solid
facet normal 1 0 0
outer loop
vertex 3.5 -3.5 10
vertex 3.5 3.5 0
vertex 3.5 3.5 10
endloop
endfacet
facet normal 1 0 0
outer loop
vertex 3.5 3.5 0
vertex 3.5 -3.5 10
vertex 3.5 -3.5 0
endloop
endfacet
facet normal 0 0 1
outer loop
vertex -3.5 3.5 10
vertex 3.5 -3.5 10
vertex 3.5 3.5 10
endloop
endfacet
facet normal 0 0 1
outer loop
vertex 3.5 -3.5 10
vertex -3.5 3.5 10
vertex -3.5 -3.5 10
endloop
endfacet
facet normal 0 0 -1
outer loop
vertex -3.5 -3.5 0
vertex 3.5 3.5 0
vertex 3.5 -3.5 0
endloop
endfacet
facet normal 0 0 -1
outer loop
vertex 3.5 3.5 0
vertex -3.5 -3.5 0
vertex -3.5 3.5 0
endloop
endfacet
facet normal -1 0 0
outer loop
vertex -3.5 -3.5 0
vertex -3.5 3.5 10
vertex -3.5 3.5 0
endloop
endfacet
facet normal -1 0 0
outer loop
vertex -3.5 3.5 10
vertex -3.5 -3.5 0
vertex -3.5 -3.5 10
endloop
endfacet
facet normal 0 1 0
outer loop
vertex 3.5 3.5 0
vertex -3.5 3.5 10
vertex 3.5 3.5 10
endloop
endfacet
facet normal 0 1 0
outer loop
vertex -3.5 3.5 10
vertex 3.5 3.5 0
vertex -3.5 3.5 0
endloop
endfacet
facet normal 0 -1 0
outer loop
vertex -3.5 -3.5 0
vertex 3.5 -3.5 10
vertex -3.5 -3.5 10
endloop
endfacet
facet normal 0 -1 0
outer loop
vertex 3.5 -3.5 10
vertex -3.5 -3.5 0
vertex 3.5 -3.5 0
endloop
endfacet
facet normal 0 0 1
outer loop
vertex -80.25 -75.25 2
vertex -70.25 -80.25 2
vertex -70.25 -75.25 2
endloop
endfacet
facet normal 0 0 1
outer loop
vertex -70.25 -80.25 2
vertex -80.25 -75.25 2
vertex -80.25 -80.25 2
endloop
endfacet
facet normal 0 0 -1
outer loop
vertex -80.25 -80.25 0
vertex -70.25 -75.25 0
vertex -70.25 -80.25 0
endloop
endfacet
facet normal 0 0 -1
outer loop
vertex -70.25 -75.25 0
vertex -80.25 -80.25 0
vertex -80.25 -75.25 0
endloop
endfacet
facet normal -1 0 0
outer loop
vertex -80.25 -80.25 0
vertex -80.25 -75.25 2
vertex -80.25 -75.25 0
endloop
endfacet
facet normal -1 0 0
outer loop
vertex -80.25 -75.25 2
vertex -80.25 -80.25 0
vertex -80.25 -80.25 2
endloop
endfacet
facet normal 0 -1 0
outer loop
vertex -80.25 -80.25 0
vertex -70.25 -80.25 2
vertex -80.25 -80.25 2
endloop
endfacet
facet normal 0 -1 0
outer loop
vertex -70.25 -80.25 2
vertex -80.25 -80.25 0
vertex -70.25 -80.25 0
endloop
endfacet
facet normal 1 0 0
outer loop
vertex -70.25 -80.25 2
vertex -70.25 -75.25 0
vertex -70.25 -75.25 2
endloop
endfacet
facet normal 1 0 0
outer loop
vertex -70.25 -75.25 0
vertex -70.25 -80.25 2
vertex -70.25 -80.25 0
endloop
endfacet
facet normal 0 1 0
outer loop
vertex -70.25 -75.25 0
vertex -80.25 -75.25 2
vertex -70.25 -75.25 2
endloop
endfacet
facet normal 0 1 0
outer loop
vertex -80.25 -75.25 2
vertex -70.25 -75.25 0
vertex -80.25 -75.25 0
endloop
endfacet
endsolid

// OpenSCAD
translate([0, 0, 5]) color([0,1,0,0.9]) cube([7, 7, 10], center=true);
translate([-80.0, -80.0, 1]) color([1,0,0]) cube([0.5, 0.5, 2], center=true);
translate([-79.5, -80.0, 1]) color([1,0,0]) cube([0.5, 0.5, 2], center=true);
translate([-79.0, -80.0, 1]) color([1,0,0]) cube([0.5, 0.5, 2], center=true);
translate([-78.5, -80.0, 1]) color([1,0,0]) cube([0.5, 0.5, 2], center=true);
translate([-78.0, -80.0, 1]) color([1,0,0]) cube([0.5, 0.5, 2], center=true);
translate([-77.5, -80.0, 1]) color([1,0,0]) cube([0.5, 0.5, 2], center=true);
translate([-77.0, -80.0, 1]) color([1,0,0]) cube([0.5, 0.5, 2], center=true);
translate([-76.5, -80.0, 1]) color([1,0,0]) cube([0.5, 0.5, 2], center=true);
translate([-76.0, -80.0, 1]) color([1,0,0]) cube([0.5, 0.5, 2], center=true);
translate([-75.5, -80.0, 1]) color([1,0,0]) cube([0.5, 0.5, 2], center=true);
translate([-75.0, -80.0, 1]) color([1,0,0]) cube([0.5, 0.5, 2], center=true);
translate([-74.5, -80.0, 1]) color([1,0,0]) cube([0.5, 0.5, 2], center=true);
translate([-74.0, -80.0, 1]) color([1,0,0]) cube([0.5, 0.5, 2], center=true);
translate([-73.5, -80.0, 1]) color([1,0,0]) cube([0.5, 0.5, 2], center=true);
translate([-73.0, -80.0, 1]) color([1,0,0]) cube([0.5, 0.5, 2], center=true);
translate([-72.5, -80.0, 1]) color([1,0,0]) cube([0.5, 0.5, 2], center=true);
translate([-72.0, -80.0, 1]) color([1,0,0]) cube([0.5, 0.5, 2], center=true);
translate([-71.5, -80.0, 1]) color([1,0,0]) cube([0.5, 0.5, 2], center=true);
translate([-71.0, -80.0, 1]) color([1,0,0]) cube([0.5, 0.5, 2], center=true);
translate([-70.5, -80.0, 1]) color([1,0,0]) cube([0.5, 0.5, 2], center=true);
translate([-80.0, -79.5, 1]) color([1,0,0]) cube([0.5, 0.5, 2], center=true);
translate([-79.5, -79.5, 1]) color([1,0,0]) cube([0.5, 0.5, 2], center=true);
translate([-79.0, -79.5, 1]) color([1,0,0]) cube([0.5, 0.5, 2], center=true);
translate([-78.5, -79.5, 1]) color([1,0,0]) cube([0.5, 0.5, 2], center=true);
translate([-78.0, -79.5, 1]) color([1,0,0]) cube([0.5, 0.5, 2], center=true);
translate([-77.5, -79.5, 1]) color([1,0,0]) cube([0.5, 0.5, 2], center=true);
translate([-77.0, -79.5, 1]) color([1,0,0]) cube([0.5, 0.5, 2], center=true);
translate([-76.5, -79.5, 1]) color([1,0,0]) cube([0.5, 0.5, 2], center=true);
translate([-76.0, -79.5, 1]) color([1,0,0]) cube([0.5, 0.5, 2], center=true);
translate([-75.5, -79.5, 1]) color([1,0,0]) cube([0.5, 0.5, 2], center=true);
translate([-75.0, -79.5, 1]) color([1,0,0]) cube([0.5, 0.5, 2], center=true);
translate([-74.5, -79.5, 1]) color([1,0,0]) cube([0.5, 0.5, 2], center=true);
translate([-74.0, -79.5, 1]) color([1,0,0]) cube([0.5, 0.5, 2], center=true);
translate([-73.5, -79.5, 1]) color([1,0,0]) cube([0.5, 0.5, 2], center=true);
translate([-73.0, -79.5, 1]) color([1,0,0]) cube([0.5, 0.5, 2], center=true);
translate([-72.5, -79.5, 1]) color([1,0,0]) cube([0.5, 0.5, 2], center=true);
translate([-72.0, -79.5, 1]) color([1,0,0]) cube([0.5, 0.5, 2], center=true);
translate([-71.5, -79.5, 1]) color([1,0,0]) cube([0.5, 0.5, 2], center=true);
translate([-71.0, -79.5, 1]) color([1,0,0]) cube([0.5, 0.5, 2], center=true);
translate([-70.5, -79.5, 1]) color([1,0,0]) cube([0.5, 0.5, 2], center=true);
translate([-80.0, -79.0, 1]) color([1,0,0]) cube([0.5, 0.5, 2], center=true);
translate([-79.5, -79.0, 1]) color([1,0,0]) cube([0.5, 0.5, 2], center=true);
translate([-79.0, -79.0, 1]) color([1,0,0]) cube([0.5, 0.5, 2], center=true);
translate([-78.5, -79.0, 1]) color([1,0,0]) cube([0.5, 0.5, 2], center=true);
translate([-78.0, -79.0, 1]) color([1,0,0]) cube([0.5, 0.5, 2], center=true);
translate([-77.5, -79.0, 1]) color([1,0,0]) cube([0.5, 0.5, 2], center=true);
translate([-77.0, -79.0, 1]) color([1,0,0]) cube([0.5, 0.5, 2], center=true);
translate([-76.5, -79.0, 1]) color([1,0,0]) cube([0.5, 0.5, 2], center=true);
translate([-76.0, -79.0, 1]) color([1,0,0]) cube([0.5, 0.5, 2], center=true);
translate([-75.5, -79.0, 1]) color([1,0,0]) cube([0.5, 0.5, 2], center=true);
translate([-75.0, -79.0, 1]) color([1,0,0]) cube([0.5, 0.5, 2], center=true);
translate([-74.5, -79.0, 1]) color([1,0,0]) cube([0.5, 0.5, 2], center=true);
translate([-74.0, -79.0, 1]) color([1,0,0]) cube([0.5, 0.5, 2], center=true);
translate([-73.5, -79.0, 1]) color([1,0,0]) cube([0.5, 0.5, 2], center=true);
translate([-73.0, -79.0, 1]) color([1,0,0]) cube([0.5, 0.5, 2], center=true);
translate([-72.5, -79.0, 1]) color([1,0,0]) cube([0.5, 0.5, 2], center=true);
translate([-72.0, -79.0, 1]) color([1,0,0]) cube([0.5, 0.5, 2], center=true);
translate([-71.5, -79.0, 1]) color([1,0,0]) cube([0.5, 0.5, 2], center=true);
translate([-71.0, -79.0, 1]) color([1,0,0]) cube([0.5, 0.5, 2], center=true);
translate([-70.5, -79.0, 1]) color([1,0,0]) cube([0.5, 0.5, 2], center=true);
translate([-80.0, -78.5, 1]) color([1,0,0]) cube([0.5, 0.5, 2], center=true);
translate([-79.5, -78.5, 1]) color([1,0,0]) cube([0.5, 0.5, 2], center=true);
translate([-79.0, -78.5, 1]) color([1,0,0]) cube([0.5, 0.5, 2], center=true);
translate([-78.5, -78.5, 1]) color([1,0,0]) cube([0.5, 0.5, 2], center=true);
translate([-78.0, -78.5, 1]) color([1,0,0]) cube([0.5, 0.5, 2], center=true);
translate([-77.5, -78.5, 1]) color([1,0,0]) cube([0.5, 0.5, 2], center=true);
translate([-77.0, -78.5, 1]) color([1,0,0]) cube([0.5, 0.5, 2], center=true);
translate([-76.5, -78.5, 1]) color([1,0,0]) cube([0.5, 0.5, 2], center=true);
translate([-76.0, -78.5, 1]) color([1,0,0]) cube([0.5, 0.5, 2], center=true);
translate([-75.5, -78.5, 1]) color([1,0,0]) cube([0.5, 0.5, 2], center=true);
translate([-75.0, -78.5, 1]) color([1,0,0]) cube([0.5, 0.5, 2], center=true);
translate([-74.5, -78.5, 1]) color([1,0,0]) cube([0.5, 0.5, 2], center=true);
translate([-74.0, -78.5, 1]) color([1,0,0]) cube([0.5, 0.5, 2], center=true);
translate([-73.5, -78.5, 1]) color([1,0,0]) cube([0.5, 0.5, 2], center=true);
translate([-73.0, -78.5, 1]) color([1,0,0]) cube([0.5, 0.5, 2], center=true);
translate([-72.5, -78.5, 1]) color([1,0,0]) cube([0.5, 0.5, 2], center=true);
translate([-72.0, -78.5, 1]) color([1,0,0]) cube([0.5, 0.5, 2], center=true);
translate([-71.5, -78.5, 1]) color([1,0,0]) cube([0.5, 0.5, 2], center=true);
translate([-71.0, -78.5, 1]) color([1,0,0]) cube([0.5, 0.5, 2], center=true);
translate([-70.5, -78.5, 1]) color([1,0,0]) cube([0.5, 0.5, 2], center=true);
translate([-80.0, -78.0, 1]) color([1,0,0]) cube([0.5, 0.5, 2], center=true);
translate([-79.5, -78.0, 1]) color([1,0,0]) cube([0.5, 0.5, 2], center=true);
translate([-79.0, -78.0, 1]) color([1,0,0]) cube([0.5, 0.5, 2], center=true);
translate([-78.5, -78.0, 1]) color([1,0,0]) cube([0.5, 0.5, 2], center=true);
translate([-78.0, -78.0, 1]) color([1,0,0]) cube([0.5, 0.5, 2], center=true);
translate([-77.5, -78.0, 1]) color([1,0,0]) cube([0.5, 0.5, 2], center=true);
translate([-77.0, -78.0, 1]) color([1,0,0]) cube([0.5, 0.5, 2], center=true);
translate([-76.5, -78.0, 1]) color([1,0,0]) cube([0.5, 0.5, 2], center=true);
translate([-76.0, -78.0, 1]) color([1,0,0]) cube([0.5, 0.5, 2], center=true);
translate([-75.5, -78.0, 1]) color([1,0,0]) cube([0.5, 0.5, 2], center=true);
translate([-75.0, -78.0, 1]) color([1,0,0]) cube([0.5, 0.5, 2], center=true);
translate([-74.5, -78.0, 1]) color([1,0,0]) cube([0.5, 0.5, 2], center=true);
translate([-74.0, -78.0, 1]) color([1,0,0]) cube([0.5, 0.5, 2], center=true);
translate([-73.5, -78.0, 1]) color([1,0,0]) cube([0.5, 0.5, 2], center=true);
translate([-73.0, -78.0, 1]) color([1,0,0]) cube([0.5, 0.5, 2], center=true);
translate([-72.5, -78.0, 1]) color([1,0,0]) cube([0.5, 0.5, 2], center=true);
translate([-72.0, -78.0, 1]) color([1,0,0]) cube([0.5, 0.5, 2], center=true);
translate([-71.5, -78.0, 1]) color([1,0,0]) cube([0.5, 0.5, 2], center=true);
translate([-71.0, -78.0, 1]) color([1,0,0]) cube([0.5, 0.5, 2], center=true);
translate([-70.5, -78.0, 1]) color([1,0,0]) cube([0.5, 0.5, 2], center=true);
translate([-80.0, -77.5, 1]) color([1,0,0]) cube([0.5, 0.5, 2], center=true);
translate([-79.5, -77.5, 1]) color([1,0,0]) cube([0.5, 0.5, 2], center=true);
translate([-79.0, -77.5, 1]) color([1,0,0]) cube([0.5, 0.5, 2], center=true);
translate([-78.5, -77.5, 1]) color([1,0,0]) cube([0.5, 0.5, 2], center=true);
translate([-78.0, -77.5, 1]) color([1,0,0]) cube([0.5, 0.5, 2], center=true);
translate([-77.5, -77.5, 1]) color([1,0,0]) cube([0.5, 0.5, 2], center=true);
translate([-77.0, -77.5, 1]) color([1,0,0]) cube([0.5, 0.5, 2], center=true);
translate([-76.5, -77.5, 1]) color([1,0,0]) cube([0.5, 0.5, 2], center=true);
translate([-76.0, -77.5, 1]) color([1,0,0]) cube([0.5, 0.5, 2], center=true);
translate([-75.5, -77.5, 1]) color([1,0,0]) cube([0.5, 0.5, 2], center=true);
translate([-75.0, -77.5, 1]) color([1,0,0]) cube([0.5, 0.5, 2], center=true);
translate([-74.5, -77.5, 1]) color([1,0,0]) cube([0.5, 0.5, 2], center=true);
translate([-74.0, -77.5, 1]) color([1,0,0]) cube([0.5, 0.5, 2], center=true);
translate([-73.5, -77.5, 1]) color([1,0,0]) cube([0.5, 0.5, 2], center=true);
translate([-73.0, -77.5, 1]) color([1,0,0]) cube([0.5, 0.5, 2], center=true);
translate([-72.5, -77.5, 1]) color([1,0,0]) cube([0.5, 0.5, 2], center=true);
translate([-72.0, -77.5, 1]) color([1,0,0]) cube([0.5, 0.5, 2], center=true);
translate([-71.5, -77.5, 1]) color([1,0,0]) cube([0.5, 0.5, 2], center=true);
translate([-71.0, -77.5, 1]) color([1,0,0]) cube([0.5, 0.5, 2], center=true);
translate([-70.5, -77.5, 1]) color([1,0,0]) cube([0.5, 0.5, 2], center=true);
translate([-80.0, -77.0, 1]) color([1,0,0]) cube([0.5, 0.5, 2], center=true);
translate([-79.5, -77.0, 1]) color([1,0,0]) cube([0.5, 0.5, 2], center=true);
translate([-79.0, -77.0, 1]) color([1,0,0]) cube([0.5, 0.5, 2], center=true);
translate([-78.5, -77.0, 1]) color([1,0,0]) cube([0.5, 0.5, 2], center=true);
translate([-78.0, -77.0, 1]) color([1,0,0]) cube([0.5, 0.5, 2], center=true);
translate([-77.5, -77.0, 1]) color([1,0,0]) cube([0.5, 0.5, 2], center=true);
translate([-77.0, -77.0, 1]) color([1,0,0]) cube([0.5, 0.5, 2], center=true);
translate([-76.5, -77.0, 1]) color([1,0,0]) cube([0.5, 0.5, 2], center=true);
translate([-76.0, -77.0, 1]) color([1,0,0]) cube([0.5, 0.5, 2], center=true);
translate([-75.5, -77.0, 1]) color([1,0,0]) cube([0.5, 0.5, 2], center=true);
translate([-75.0, -77.0, 1]) color([1,0,0]) cube([0.5, 0.5, 2], center=true);
translate([-74.5, -77.0, 1]) color([1,0,0]) cube([0.5, 0.5, 2], center=true);
translate([-74.0, -77.0, 1]) color([1,0,0]) cube([0.5, 0.5, 2], center=true);
translate([-73.5, -77.0, 1]) color([1,0,0]) cube([0.5, 0.5, 2], center=true);
translate([-73.0, -77.0, 1]) color([1,0,0]) cube([0.5, 0.5, 2], center=true);
translate([-72.5, -77.0, 1]) color([1,0,0]) cube([0.5, 0.5, 2], center=true);
translate([-72.0, -77.0, 1]) color([1,0,0]) cube([0.5, 0.5, 2], center=true);
translate([-71.5, -77.0, 1]) color([1,0,0]) cube([0.5, 0.5, 2], center=true);
translate([-71.0, -77.0, 1]) color([1,0,0]) cube([0.5, 0.5, 2], center=true);
translate([-70.5, -77.0, 1]) color([1,0,0]) cube([0.5, 0.5, 2], center=true);
translate([-80.0, -76.5, 1]) color([1,0,0]) cube([0.5, 0.5, 2], center=true);
translate([-79.5, -76.5, 1]) color([1,0,0]) cube([0.5, 0.5, 2], center=true);
translate([-79.0, -76.5, 1]) color([1,0,0]) cube([0.5, 0.5, 2], center=true);
translate([-78.5, -76.5, 1]) color([1,0,0]) cube([0.5, 0.5, 2], center=true);
translate([-78.0, -76.5, 1]) color([1,0,0]) cube([0.5, 0.5, 2], center=true);
translate([-77.5, -76.5, 1]) color([1,0,0]) cube([0.5, 0.5, 2], center=true);
translate([-77.0, -76.5, 1]) color([1,0,0]) cube([0.5, 0.5, 2], center=true);
translate([-76.5, -76.5, 1]) color([1,0,0]) cube([0.5, 0.5, 2], center=true);
translate([-76.0, -76.5, 1]) color([1,0,0]) cube([0.5, 0.5, 2], center=true);
translate([-75.5, -76.5, 1]) color([1,0,0]) cube([0.5, 0.5, 2], center=true);
translate([-75.0, -76.5, 1]) color([1,0,0]) cube([0.5, 0.5, 2], center=true);
translate([-74.5, -76.5, 1]) color([1,0,0]) cube([0.5, 0.5, 2], center=true);
translate([-74.0, -76.5, 1]) color([1,0,0]) cube([0.5, 0.5, 2], center=true);
translate([-73.5, -76.5, 1]) color([1,0,0]) cube([0.5, 0.5, 2], center=true);
translate([-73.0, -76.5, 1]) color([1,0,0]) cube([0.5, 0.5, 2], center=true);
translate([-72.5, -76.5, 1]) color([1,0,0]) cube([0.5, 0.5, 2], center=true);
translate([-72.0, -76.5, 1]) color([1,0,0]) cube([0.5, 0.5, 2], center=true);
translate([-71.5, -76.5, 1]) color([1,0,0]) cube([0.5, 0.5, 2], center=true);
translate([-71.0, -76.5, 1]) color([1,0,0]) cube([0.5, 0.5, 2], center=true);
translate([-70.5, -76.5, 1]) color([1,0,0]) cube([0.5, 0.5, 2], center=true);
translate([-80.0, -76.0, 1]) color([1,0,0]) cube([0.5, 0.5, 2], center=true);
translate([-79.5, -76.0, 1]) color([1,0,0]) cube([0.5, 0.5, 2], center=true);
translate([-79.0, -76.0, 1]) color([1,0,0]) cube([0.5, 0.5, 2], center=true);
translate([-78.5, -76.0, 1]) color([1,0,0]) cube([0.5, 0.5, 2], center=true);
translate([-78.0, -76.0, 1]) color([1,0,0]) cube([0.5, 0.5, 2], center=true);
translate([-77.5, -76.0, 1]) color([1,0,0]) cube([0.5, 0.5, 2], center=true);
translate([-77.0, -76.0, 1]) color([1,0,0]) cube([0.5, 0.5, 2], center=true);
translate([-76.5, -76.0, 1]) color([1,0,0]) cube([0.5, 0.5, 2], center=true);
translate([-76.0, -76.0, 1]) color([1,0,0]) cube([0.5, 0.5, 2], center=true);
translate([-75.5, -76.0, 1]) color([1,0,0]) cube([0.5, 0.5, 2], center=true);
translate([-75.0, -76.0, 1]) color([1,0,0]) cube([0.5, 0.5, 2], center=true);
translate([-74.5, -76.0, 1]) color([1,0,0]) cube([0.5, 0.5, 2], center=true);
translate([-74.0, -76.0, 1]) color([1,0,0]) cube([0.5, 0.5, 2], center=true);
translate([-73.5, -76.0, 1]) color([1,0,0]) cube([0.5, 0.5, 2], center=true);
translate([-73.0, -76.0, 1]) color([1,0,0]) cube([0.5, 0.5, 2], center=true);
translate([-72.5, -76.0, 1]) color([1,0,0]) cube([0.5, 0.5, 2], center=true);
translate([-72.0, -76.0, 1]) color([1,0,0]) cube([0.5, 0.5, 2], center=true);
translate([-71.5, -76.0, 1]) color([1,0,0]) cube([0.5, 0.5, 2], center=true);
translate([-71.0, -76.0, 1]) color([1,0,0]) cube([0.5, 0.5, 2], center=true);
translate([-70.5, -76.0, 1]) color([1,0,0]) cube([0.5, 0.5, 2], center=true);
translate([-80.0, -75.5, 1]) color([1,0,0]) cube([0.5, 0.5, 2], center=true);
translate([-79.5, -75.5, 1]) color([1,0,0]) cube([0.5, 0.5, 2], center=true);
translate([-79.0, -75.5, 1]) color([1,0,0]) cube([0.5, 0.5, 2], center=true);
translate([-78.5, -75.5, 1]) color([1,0,0]) cube([0.5, 0.5, 2], center=true);
translate([-78.0, -75.5, 1]) color([1,0,0]) cube([0.5, 0.5, 2], center=true);
translate([-77.5, -75.5, 1]) color([1,0,0]) cube([0.5, 0.5, 2], center=true);
translate([-77.0, -75.5, 1]) color([1,0,0]) cube([0.5, 0.5, 2], center=true);
translate([-76.5, -75.5, 1]) color([1,0,0]) cube([0.5, 0.5, 2], center=true);
translate([-76.0, -75.5, 1]) color([1,0,0]) cube([0.5, 0.5, 2], center=true);
translate([-75.5, -75.5, 1]) color([1,0,0]) cube([0.5, 0.5, 2], center=true);
translate([-75.0, -75.5, 1]) color([1,0,0]) cube([0.5, 0.5, 2], center=true);
translate([-74.5, -75.5, 1]) color([1,0,0]) cube([0.5, 0.5, 2], center=true);
translate([-74.0, -75.5, 1]) color([1,0,0]) cube([0.5, 0.5, 2], center=true);
translate([-73.5, -75.5, 1]) color([1,0,0]) cube([0.5, 0.5, 2], center=true);
translate([-73.0, -75.5, 1]) color([1,0,0]) cube([0.5, 0.5, 2], center=true);
translate([-72.5, -75.5, 1]) color([1,0,0]) cube([0.5, 0.5, 2], center=true);
translate([-72.0, -75.5, 1]) color([1,0,0]) cube([0.5, 0.5, 2], center=true);
translate([-71.5, -75.5, 1]) color([1,0,0]) cube([0.5, 0.5, 2], center=true);
translate([-71.0, -75.5, 1]) color([1,0,0]) cube([0.5, 0.5, 2], center=true);
translate([-70.5, -75.5, 1]) color([1,0,0]) cube([0.5, 0.5, 2], center=true);
